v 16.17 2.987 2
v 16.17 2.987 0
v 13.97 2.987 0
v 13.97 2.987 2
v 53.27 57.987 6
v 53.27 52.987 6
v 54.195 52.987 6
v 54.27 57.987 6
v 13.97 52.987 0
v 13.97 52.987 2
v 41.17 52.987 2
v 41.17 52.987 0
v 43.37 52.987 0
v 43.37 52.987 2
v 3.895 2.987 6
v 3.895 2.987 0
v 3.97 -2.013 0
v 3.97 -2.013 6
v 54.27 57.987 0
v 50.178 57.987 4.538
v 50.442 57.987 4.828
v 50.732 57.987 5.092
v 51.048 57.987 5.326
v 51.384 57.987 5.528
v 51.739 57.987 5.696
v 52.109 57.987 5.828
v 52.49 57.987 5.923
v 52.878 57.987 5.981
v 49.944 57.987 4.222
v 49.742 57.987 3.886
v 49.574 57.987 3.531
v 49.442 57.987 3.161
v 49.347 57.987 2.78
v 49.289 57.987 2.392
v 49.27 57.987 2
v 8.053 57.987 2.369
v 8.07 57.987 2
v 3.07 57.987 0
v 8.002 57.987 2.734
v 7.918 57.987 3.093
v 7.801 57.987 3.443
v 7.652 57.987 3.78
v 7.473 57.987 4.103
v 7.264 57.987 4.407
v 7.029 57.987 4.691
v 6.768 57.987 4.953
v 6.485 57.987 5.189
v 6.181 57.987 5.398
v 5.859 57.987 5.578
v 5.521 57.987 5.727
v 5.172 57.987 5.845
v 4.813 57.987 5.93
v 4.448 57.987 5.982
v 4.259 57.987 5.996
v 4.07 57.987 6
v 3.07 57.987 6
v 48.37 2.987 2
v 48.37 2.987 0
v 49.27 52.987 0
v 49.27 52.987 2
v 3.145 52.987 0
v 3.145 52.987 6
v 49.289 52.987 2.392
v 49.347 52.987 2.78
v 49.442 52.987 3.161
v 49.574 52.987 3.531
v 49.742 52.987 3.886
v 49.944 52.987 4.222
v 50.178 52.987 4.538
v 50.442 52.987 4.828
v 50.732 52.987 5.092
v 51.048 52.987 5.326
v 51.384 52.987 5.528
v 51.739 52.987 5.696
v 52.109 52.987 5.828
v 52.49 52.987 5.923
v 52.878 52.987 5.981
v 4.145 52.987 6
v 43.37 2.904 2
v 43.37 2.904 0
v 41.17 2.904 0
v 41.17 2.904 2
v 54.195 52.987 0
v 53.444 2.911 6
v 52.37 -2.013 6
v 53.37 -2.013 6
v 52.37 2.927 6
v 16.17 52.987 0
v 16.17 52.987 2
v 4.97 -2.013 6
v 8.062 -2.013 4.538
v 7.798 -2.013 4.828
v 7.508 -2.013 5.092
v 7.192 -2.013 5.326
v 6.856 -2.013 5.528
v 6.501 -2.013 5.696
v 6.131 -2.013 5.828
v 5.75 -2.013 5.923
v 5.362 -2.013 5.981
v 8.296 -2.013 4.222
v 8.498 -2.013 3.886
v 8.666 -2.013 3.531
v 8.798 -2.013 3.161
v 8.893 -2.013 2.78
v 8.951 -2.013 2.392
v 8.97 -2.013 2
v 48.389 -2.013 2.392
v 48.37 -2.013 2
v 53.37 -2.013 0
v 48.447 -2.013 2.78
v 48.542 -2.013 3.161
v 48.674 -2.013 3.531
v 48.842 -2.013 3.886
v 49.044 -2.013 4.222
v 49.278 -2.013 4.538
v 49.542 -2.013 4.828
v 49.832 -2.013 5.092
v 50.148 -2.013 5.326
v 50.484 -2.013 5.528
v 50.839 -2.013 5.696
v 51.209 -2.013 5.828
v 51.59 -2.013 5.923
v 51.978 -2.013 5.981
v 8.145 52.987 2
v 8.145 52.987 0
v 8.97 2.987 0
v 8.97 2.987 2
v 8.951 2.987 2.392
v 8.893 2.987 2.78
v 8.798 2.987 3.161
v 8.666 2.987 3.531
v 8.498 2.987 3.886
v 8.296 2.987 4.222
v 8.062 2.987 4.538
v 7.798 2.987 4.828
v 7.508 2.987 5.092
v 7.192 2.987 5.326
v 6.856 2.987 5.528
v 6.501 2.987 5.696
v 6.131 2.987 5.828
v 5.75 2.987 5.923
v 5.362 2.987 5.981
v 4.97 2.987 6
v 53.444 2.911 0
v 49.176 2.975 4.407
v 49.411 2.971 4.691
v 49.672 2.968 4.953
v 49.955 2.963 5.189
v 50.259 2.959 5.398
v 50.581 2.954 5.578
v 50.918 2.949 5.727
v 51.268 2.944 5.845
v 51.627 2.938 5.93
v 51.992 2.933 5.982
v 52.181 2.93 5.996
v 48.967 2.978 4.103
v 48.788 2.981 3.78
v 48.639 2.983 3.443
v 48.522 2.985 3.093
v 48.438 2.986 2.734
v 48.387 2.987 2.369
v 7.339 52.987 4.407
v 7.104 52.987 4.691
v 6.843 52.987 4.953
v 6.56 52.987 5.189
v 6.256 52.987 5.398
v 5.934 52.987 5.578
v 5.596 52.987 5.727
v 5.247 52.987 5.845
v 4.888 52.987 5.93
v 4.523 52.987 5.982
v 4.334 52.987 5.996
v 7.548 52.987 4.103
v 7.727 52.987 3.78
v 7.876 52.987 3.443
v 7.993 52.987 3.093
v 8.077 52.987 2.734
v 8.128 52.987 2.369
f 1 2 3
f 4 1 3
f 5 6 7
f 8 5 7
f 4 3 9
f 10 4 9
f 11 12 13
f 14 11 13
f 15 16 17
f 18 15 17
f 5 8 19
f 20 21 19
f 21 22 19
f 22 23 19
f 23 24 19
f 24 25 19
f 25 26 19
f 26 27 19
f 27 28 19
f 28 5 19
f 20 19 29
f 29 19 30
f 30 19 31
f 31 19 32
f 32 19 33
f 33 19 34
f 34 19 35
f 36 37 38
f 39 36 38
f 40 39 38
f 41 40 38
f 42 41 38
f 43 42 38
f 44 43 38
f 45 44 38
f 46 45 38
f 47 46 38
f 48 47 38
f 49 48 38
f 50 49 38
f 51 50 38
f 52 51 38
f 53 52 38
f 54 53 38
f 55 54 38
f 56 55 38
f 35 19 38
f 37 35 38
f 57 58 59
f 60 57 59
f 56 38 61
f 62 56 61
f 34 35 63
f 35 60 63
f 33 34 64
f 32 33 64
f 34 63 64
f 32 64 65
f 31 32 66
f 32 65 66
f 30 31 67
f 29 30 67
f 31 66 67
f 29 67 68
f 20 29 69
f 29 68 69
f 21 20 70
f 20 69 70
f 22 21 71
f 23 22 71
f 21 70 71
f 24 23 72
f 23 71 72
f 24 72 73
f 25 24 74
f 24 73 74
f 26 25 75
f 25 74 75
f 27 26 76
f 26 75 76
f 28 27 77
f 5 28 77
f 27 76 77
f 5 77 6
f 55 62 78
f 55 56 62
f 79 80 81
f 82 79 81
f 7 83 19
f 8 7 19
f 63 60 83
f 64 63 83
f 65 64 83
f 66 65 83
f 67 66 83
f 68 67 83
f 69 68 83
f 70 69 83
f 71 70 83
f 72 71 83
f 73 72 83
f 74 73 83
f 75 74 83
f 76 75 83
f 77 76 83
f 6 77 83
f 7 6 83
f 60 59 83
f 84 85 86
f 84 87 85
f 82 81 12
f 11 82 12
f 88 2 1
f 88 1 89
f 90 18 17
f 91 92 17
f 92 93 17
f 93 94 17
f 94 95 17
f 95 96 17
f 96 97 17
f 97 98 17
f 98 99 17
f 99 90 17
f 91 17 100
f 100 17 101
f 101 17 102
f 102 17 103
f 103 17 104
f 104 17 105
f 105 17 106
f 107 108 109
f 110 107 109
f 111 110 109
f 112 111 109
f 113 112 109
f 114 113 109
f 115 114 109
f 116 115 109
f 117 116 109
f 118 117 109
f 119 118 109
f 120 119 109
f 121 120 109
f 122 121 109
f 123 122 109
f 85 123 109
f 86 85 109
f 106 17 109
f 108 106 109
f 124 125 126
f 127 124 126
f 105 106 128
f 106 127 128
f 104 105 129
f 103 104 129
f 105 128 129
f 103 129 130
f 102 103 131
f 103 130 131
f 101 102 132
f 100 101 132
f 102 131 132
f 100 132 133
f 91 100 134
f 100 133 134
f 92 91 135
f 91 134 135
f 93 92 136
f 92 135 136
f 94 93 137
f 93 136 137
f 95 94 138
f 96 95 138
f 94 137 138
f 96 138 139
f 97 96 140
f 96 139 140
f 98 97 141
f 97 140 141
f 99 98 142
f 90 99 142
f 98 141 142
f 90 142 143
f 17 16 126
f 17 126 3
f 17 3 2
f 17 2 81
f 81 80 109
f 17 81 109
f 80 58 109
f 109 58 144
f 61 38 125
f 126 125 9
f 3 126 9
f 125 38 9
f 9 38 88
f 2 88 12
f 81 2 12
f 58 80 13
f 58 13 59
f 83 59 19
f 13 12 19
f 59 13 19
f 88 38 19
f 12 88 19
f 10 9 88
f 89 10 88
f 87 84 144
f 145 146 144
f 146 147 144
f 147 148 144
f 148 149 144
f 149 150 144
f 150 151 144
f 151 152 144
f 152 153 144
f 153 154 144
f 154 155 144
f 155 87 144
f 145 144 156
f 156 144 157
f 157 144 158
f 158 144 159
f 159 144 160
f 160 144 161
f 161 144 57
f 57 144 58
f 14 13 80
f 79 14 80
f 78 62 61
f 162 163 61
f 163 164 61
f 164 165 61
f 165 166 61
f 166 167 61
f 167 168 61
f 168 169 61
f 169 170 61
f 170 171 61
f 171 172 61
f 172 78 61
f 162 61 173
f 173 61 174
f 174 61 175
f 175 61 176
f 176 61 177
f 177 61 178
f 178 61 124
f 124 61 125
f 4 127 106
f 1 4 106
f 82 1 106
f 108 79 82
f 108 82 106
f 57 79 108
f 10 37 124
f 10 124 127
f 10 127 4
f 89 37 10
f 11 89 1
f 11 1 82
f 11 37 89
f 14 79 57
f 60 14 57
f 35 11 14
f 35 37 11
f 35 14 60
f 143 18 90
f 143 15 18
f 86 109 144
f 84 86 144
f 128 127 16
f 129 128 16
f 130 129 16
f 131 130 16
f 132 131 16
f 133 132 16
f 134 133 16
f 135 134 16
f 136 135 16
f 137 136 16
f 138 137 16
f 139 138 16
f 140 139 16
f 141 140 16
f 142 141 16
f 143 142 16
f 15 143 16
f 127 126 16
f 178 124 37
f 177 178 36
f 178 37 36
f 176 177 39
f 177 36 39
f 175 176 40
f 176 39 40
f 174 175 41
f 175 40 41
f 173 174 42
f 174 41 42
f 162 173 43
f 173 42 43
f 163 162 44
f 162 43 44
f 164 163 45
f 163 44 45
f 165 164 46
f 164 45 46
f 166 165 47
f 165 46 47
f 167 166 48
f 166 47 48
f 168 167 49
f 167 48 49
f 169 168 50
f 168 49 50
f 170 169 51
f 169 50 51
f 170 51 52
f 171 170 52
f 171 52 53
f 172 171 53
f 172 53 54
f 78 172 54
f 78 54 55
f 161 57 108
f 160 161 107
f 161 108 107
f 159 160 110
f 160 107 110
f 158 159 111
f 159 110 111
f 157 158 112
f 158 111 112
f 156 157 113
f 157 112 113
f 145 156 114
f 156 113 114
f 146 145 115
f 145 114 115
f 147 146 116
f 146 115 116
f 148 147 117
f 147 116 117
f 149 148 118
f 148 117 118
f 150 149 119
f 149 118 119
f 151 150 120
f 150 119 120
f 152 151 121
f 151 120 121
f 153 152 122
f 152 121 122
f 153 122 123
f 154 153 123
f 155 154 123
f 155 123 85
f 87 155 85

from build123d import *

# Parameters (mm, degrees)
F0_W     = 25
F0_H     = 50
F1_DEPTH = 2
F2_DEPTH = 6
F3_R     = 3.99999


# Not quite as in the source:
# - a fillet or chamfer is up to 0.001 mm smaller than in the source, because OpenCascade refuses the exact size


with BuildPart() as f1:
    # F0 (on Top) → F1 (new body)
    with BuildSketch(Plane.XY):
        Polygon((8.9700092217, 2.9870720308), (8.9700092217, -2.0129279692), (48.3700092217, -2.0129279692), (48.3700092217, 2.9870720308), (49.2700092217, 52.9870720308), (49.2700092217, 57.9870720308), (8.0700092217, 57.9870720308), (8.1450092217, 52.9870720308), align=None)
        Polygon((41.1700092217, 2.9040758964), (41.1700092217, 2.9870720308), (16.1700092217, 2.9870720308), (13.9700092217, 2.9870720308), (13.9700092217, 52.9870720308), (16.1700092217, 52.9870720308), (41.1700092217, 52.9870720308), (43.3700092217, 52.9870720308), (43.3700092217, 2.9040758964), align=None, mode=Mode.SUBTRACT)
        Polygon((49.2700092217, 57.9870720308), (49.2700092217, 52.9870720308), (54.1950092217, 52.9870720308), (54.2700092217, 57.9870720308), align=None)
        Polygon((3.0700092217, 57.9870720308), (3.1450092217, 52.9870720308), (8.1450092217, 52.9870720308), (8.0700092217, 57.9870720308), align=None)
        Polygon((3.8950092217, 2.9870720308), (3.9700092217, -2.0129279692), (8.9700092217, -2.0129279692), (8.9700092217, 2.9870720308), align=None)
        Polygon((48.3700092217, 2.9870720308), (48.3700092217, -2.0129279692), (53.3700092217, -2.0129279692), (53.4438676036, 2.910964155), align=None)
        with Locations((28.6700092217, 27.9870720308)):
            Rectangle(F0_W, F0_H)
    extrude(amount=F1_DEPTH)

    # F0 (on Top) → F2 (join)
    with BuildSketch(Plane.XY):
        Polygon((3.8950092217, 2.9870720308), (3.9700092217, -2.0129279692), (8.9700092217, -2.0129279692), (8.9700092217, 2.9870720308), align=None)
        Polygon((48.3700092217, 2.9870720308), (48.3700092217, -2.0129279692), (53.3700092217, -2.0129279692), (53.4438676036, 2.910964155), align=None)
        Polygon((49.2700092217, 57.9870720308), (49.2700092217, 52.9870720308), (54.1950092217, 52.9870720308), (54.2700092217, 57.9870720308), align=None)
        Polygon((3.0700092217, 57.9870720308), (3.1450092217, 52.9870720308), (8.1450092217, 52.9870720308), (8.0700092217, 57.9870720308), align=None)
    extrude(amount=F2_DEPTH)

    # F3 (radius 4 in the source; OpenCascade refuses exactly that, so slightly less here)
    f3_edges = [f1.edges().sort_by_distance(p)[0] for p in [
        (8.970009, 0.487072, 6),
        (8.107509, 55.487072, 6),
        (49.270009, 55.487072, 6),
        (48.370009, 0.487072, 6),
    ]]
    fillet(f3_edges, radius=F3_R)


solid = f1.part
